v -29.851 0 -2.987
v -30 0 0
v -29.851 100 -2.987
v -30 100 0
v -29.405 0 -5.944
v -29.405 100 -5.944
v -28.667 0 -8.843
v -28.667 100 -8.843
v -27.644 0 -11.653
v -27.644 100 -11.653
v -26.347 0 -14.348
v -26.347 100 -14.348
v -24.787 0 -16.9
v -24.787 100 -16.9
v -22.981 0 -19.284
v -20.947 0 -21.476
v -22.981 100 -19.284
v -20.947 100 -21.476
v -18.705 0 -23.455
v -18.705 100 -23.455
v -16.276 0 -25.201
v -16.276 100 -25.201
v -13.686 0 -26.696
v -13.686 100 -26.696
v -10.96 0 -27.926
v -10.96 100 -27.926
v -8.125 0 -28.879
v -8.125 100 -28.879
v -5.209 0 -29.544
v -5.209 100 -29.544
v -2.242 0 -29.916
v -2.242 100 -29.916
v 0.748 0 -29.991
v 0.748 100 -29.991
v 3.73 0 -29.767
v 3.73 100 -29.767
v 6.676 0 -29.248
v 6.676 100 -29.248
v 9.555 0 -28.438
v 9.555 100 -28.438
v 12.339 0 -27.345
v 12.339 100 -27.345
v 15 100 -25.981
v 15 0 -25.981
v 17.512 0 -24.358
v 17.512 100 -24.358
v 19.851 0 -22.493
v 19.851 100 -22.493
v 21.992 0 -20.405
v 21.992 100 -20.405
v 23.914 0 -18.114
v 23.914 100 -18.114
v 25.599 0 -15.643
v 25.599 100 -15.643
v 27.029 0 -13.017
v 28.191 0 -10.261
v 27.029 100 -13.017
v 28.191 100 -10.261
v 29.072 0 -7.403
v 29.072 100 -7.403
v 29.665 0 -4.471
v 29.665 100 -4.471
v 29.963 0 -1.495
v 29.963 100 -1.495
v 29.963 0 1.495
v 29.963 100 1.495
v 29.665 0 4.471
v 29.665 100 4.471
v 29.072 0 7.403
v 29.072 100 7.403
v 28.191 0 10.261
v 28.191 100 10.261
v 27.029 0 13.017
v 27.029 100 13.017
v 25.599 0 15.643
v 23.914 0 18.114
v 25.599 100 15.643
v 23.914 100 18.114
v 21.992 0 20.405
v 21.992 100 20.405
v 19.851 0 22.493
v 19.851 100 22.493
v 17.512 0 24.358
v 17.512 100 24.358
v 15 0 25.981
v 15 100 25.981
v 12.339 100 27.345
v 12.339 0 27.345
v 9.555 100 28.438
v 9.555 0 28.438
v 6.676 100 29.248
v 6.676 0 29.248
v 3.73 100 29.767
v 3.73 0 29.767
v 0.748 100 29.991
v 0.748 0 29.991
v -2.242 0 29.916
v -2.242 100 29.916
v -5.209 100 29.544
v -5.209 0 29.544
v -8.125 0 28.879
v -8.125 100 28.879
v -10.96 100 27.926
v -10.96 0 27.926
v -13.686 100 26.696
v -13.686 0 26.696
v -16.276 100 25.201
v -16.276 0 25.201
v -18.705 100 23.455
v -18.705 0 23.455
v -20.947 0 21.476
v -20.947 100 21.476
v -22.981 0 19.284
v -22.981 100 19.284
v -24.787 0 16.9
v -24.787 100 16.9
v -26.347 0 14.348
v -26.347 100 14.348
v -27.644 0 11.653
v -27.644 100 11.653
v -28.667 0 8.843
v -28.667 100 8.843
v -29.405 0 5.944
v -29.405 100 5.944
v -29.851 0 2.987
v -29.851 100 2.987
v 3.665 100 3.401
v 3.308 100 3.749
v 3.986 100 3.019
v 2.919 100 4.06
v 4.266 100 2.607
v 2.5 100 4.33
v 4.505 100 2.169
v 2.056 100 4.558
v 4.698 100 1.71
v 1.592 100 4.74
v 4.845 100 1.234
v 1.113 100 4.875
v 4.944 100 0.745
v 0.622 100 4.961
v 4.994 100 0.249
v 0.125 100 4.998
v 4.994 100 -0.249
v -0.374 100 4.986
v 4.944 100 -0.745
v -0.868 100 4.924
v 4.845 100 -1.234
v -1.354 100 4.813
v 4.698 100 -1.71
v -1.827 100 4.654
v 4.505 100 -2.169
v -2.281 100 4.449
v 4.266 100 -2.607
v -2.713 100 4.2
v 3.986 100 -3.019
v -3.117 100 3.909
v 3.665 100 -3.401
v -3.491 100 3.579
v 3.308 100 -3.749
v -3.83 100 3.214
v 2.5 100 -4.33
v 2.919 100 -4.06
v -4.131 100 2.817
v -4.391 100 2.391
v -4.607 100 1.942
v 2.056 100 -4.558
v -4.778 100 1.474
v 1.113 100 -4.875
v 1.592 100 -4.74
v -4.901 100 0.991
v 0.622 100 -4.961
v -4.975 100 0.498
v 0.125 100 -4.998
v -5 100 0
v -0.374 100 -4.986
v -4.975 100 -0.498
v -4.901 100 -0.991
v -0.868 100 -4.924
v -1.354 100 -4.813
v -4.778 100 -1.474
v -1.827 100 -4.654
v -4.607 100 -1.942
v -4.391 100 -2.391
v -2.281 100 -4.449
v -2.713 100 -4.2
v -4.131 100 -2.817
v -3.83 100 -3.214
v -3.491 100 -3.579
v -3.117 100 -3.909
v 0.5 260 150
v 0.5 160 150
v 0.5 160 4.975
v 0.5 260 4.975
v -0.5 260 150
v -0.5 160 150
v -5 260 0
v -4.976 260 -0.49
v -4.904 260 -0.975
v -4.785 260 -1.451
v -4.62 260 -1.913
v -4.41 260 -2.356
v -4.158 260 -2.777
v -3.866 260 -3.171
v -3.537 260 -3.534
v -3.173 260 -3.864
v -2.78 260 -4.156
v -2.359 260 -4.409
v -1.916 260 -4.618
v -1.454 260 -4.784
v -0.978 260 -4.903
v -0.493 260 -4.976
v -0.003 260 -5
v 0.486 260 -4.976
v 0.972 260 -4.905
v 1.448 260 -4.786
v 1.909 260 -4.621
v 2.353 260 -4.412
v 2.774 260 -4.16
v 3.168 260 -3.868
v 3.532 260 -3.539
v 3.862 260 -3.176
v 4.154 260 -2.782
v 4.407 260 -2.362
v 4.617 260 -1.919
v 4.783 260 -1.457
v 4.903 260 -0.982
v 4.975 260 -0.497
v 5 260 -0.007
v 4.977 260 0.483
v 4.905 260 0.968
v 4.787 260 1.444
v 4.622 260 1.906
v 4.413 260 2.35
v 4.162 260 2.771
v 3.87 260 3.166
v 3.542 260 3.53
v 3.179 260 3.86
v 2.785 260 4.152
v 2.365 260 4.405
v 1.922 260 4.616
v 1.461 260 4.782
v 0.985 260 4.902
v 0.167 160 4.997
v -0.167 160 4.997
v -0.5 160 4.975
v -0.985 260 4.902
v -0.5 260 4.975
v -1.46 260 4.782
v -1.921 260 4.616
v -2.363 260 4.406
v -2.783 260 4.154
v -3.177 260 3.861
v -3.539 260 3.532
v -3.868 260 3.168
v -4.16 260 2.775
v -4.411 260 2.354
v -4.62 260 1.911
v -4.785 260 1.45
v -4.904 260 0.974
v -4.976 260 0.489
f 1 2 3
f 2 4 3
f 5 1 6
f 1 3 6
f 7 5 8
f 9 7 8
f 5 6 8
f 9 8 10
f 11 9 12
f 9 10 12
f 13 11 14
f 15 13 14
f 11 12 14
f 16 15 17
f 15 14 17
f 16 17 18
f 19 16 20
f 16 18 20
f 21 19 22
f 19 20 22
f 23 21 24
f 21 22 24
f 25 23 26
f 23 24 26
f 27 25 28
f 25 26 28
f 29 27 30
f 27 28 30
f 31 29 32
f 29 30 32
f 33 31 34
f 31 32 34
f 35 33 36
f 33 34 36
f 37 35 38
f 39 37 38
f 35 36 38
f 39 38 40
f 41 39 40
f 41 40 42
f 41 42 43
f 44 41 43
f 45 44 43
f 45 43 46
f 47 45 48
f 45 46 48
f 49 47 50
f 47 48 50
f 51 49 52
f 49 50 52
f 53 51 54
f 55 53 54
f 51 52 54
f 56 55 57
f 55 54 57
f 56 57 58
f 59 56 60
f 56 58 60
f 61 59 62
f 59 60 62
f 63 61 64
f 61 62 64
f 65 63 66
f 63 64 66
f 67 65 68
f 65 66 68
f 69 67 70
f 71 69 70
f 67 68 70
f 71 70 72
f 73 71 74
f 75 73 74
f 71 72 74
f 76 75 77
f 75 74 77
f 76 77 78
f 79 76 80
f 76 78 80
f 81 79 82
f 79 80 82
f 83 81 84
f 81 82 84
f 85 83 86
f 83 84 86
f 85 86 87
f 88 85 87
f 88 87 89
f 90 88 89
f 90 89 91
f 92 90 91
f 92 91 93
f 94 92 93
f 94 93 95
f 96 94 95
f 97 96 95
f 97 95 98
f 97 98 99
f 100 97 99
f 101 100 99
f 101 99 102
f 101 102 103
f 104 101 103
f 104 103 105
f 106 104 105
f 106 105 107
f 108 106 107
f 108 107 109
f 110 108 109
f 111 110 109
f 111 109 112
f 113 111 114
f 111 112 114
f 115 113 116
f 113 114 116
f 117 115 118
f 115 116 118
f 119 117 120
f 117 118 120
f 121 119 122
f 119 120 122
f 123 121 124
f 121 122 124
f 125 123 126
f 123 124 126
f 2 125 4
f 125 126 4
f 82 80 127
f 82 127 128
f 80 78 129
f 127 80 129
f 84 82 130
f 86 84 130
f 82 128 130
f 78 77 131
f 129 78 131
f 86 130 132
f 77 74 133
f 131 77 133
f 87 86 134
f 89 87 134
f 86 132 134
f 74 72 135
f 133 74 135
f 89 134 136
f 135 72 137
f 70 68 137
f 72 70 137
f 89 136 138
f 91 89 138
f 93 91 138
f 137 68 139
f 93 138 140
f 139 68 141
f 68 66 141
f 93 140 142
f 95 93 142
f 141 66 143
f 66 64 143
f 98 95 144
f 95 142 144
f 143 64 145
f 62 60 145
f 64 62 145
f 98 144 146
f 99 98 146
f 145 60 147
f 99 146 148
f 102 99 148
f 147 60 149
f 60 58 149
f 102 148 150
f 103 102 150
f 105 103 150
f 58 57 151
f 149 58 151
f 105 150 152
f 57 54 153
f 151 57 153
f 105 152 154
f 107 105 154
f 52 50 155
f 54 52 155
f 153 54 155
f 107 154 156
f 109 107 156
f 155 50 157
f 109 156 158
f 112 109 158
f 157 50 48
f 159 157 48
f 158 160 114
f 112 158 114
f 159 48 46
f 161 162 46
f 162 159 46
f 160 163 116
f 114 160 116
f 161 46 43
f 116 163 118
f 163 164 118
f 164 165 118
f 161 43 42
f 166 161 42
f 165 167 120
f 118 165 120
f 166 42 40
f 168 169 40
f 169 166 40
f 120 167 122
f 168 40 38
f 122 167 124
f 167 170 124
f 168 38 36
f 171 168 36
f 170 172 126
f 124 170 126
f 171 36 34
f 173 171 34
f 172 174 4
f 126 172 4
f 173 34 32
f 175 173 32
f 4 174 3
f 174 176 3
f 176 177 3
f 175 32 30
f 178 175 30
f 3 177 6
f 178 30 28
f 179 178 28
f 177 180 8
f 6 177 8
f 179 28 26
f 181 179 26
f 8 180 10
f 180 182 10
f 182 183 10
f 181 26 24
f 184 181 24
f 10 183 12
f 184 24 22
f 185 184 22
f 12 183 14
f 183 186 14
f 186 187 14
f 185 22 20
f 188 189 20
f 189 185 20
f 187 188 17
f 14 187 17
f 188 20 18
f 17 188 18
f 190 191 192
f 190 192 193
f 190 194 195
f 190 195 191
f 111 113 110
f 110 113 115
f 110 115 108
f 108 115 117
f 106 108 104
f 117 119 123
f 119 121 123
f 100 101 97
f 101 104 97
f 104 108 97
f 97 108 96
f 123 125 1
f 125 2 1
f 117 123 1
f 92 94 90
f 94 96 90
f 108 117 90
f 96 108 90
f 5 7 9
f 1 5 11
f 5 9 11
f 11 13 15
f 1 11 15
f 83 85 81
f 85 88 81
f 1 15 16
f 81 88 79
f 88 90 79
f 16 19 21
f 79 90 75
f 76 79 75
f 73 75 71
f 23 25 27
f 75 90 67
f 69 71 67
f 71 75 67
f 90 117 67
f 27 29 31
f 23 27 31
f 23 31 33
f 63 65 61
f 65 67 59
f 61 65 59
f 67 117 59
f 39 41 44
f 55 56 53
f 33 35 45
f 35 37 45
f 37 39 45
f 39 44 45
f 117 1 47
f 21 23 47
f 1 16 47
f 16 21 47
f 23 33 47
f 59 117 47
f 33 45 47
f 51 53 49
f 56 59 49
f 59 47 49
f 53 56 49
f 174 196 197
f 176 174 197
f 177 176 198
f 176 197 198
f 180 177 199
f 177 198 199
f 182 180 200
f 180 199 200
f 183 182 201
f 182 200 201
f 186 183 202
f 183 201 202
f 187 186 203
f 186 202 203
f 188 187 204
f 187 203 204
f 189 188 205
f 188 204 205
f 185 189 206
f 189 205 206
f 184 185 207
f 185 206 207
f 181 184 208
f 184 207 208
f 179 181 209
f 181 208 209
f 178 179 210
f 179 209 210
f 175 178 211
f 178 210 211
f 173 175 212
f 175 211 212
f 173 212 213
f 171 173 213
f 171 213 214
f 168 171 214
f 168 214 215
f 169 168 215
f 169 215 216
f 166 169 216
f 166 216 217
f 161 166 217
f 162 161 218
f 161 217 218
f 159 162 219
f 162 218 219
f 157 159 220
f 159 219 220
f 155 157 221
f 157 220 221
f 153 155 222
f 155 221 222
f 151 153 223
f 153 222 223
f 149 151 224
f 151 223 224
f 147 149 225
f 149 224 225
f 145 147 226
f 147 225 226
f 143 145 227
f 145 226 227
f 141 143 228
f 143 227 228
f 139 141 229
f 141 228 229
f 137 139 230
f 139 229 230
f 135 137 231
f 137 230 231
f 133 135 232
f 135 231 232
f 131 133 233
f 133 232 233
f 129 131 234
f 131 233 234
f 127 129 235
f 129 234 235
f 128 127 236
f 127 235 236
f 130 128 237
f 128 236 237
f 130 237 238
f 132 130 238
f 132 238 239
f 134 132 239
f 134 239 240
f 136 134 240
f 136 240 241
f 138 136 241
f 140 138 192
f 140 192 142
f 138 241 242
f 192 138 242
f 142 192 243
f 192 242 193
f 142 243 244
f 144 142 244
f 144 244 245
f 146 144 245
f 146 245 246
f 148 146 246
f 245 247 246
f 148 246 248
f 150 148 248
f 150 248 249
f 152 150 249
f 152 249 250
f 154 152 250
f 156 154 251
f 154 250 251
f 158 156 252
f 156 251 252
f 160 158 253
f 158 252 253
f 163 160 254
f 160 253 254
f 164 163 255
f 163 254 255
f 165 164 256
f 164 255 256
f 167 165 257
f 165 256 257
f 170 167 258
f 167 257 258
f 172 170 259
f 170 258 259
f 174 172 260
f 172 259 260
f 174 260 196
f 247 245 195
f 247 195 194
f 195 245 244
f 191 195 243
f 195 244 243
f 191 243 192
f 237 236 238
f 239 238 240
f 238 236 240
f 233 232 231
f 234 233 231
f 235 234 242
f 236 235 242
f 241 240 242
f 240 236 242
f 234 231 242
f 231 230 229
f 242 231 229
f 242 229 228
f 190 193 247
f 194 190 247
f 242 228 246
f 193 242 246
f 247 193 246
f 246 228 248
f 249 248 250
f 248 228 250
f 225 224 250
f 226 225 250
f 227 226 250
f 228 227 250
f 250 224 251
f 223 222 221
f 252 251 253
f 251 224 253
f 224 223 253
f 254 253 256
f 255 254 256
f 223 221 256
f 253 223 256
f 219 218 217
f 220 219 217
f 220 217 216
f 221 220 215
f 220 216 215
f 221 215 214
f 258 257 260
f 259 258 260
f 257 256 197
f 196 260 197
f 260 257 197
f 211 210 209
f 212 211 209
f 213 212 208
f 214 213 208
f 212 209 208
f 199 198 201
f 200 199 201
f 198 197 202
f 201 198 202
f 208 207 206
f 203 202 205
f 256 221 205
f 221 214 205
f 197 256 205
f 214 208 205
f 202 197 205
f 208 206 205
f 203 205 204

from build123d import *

# Parameters (mm, degrees)
SKETCH2_W           = 1
SKETCH2_H           = 100
BOSS_EXTRUDE1_DEPTH = 150


with BuildPart() as part:
    # Sketch1 → Revolve1 (revolve)
    with BuildSketch(Plane.XY):
        Polygon((0, 0), (-30, 0), (-30, 100), (-5, 100), (-5, 260), (0, 260), align=None)
    revolve(axis=Axis((0, 260, 0), (0, -1, 0)))

    # Sketch2 → Boss-Extrude1 (add)
    with BuildSketch(Plane.XY):
        with Locations((0, 210)):
            Rectangle(SKETCH2_W, SKETCH2_H)
    extrude(amount=BOSS_EXTRUDE1_DEPTH)


solid = part.part
